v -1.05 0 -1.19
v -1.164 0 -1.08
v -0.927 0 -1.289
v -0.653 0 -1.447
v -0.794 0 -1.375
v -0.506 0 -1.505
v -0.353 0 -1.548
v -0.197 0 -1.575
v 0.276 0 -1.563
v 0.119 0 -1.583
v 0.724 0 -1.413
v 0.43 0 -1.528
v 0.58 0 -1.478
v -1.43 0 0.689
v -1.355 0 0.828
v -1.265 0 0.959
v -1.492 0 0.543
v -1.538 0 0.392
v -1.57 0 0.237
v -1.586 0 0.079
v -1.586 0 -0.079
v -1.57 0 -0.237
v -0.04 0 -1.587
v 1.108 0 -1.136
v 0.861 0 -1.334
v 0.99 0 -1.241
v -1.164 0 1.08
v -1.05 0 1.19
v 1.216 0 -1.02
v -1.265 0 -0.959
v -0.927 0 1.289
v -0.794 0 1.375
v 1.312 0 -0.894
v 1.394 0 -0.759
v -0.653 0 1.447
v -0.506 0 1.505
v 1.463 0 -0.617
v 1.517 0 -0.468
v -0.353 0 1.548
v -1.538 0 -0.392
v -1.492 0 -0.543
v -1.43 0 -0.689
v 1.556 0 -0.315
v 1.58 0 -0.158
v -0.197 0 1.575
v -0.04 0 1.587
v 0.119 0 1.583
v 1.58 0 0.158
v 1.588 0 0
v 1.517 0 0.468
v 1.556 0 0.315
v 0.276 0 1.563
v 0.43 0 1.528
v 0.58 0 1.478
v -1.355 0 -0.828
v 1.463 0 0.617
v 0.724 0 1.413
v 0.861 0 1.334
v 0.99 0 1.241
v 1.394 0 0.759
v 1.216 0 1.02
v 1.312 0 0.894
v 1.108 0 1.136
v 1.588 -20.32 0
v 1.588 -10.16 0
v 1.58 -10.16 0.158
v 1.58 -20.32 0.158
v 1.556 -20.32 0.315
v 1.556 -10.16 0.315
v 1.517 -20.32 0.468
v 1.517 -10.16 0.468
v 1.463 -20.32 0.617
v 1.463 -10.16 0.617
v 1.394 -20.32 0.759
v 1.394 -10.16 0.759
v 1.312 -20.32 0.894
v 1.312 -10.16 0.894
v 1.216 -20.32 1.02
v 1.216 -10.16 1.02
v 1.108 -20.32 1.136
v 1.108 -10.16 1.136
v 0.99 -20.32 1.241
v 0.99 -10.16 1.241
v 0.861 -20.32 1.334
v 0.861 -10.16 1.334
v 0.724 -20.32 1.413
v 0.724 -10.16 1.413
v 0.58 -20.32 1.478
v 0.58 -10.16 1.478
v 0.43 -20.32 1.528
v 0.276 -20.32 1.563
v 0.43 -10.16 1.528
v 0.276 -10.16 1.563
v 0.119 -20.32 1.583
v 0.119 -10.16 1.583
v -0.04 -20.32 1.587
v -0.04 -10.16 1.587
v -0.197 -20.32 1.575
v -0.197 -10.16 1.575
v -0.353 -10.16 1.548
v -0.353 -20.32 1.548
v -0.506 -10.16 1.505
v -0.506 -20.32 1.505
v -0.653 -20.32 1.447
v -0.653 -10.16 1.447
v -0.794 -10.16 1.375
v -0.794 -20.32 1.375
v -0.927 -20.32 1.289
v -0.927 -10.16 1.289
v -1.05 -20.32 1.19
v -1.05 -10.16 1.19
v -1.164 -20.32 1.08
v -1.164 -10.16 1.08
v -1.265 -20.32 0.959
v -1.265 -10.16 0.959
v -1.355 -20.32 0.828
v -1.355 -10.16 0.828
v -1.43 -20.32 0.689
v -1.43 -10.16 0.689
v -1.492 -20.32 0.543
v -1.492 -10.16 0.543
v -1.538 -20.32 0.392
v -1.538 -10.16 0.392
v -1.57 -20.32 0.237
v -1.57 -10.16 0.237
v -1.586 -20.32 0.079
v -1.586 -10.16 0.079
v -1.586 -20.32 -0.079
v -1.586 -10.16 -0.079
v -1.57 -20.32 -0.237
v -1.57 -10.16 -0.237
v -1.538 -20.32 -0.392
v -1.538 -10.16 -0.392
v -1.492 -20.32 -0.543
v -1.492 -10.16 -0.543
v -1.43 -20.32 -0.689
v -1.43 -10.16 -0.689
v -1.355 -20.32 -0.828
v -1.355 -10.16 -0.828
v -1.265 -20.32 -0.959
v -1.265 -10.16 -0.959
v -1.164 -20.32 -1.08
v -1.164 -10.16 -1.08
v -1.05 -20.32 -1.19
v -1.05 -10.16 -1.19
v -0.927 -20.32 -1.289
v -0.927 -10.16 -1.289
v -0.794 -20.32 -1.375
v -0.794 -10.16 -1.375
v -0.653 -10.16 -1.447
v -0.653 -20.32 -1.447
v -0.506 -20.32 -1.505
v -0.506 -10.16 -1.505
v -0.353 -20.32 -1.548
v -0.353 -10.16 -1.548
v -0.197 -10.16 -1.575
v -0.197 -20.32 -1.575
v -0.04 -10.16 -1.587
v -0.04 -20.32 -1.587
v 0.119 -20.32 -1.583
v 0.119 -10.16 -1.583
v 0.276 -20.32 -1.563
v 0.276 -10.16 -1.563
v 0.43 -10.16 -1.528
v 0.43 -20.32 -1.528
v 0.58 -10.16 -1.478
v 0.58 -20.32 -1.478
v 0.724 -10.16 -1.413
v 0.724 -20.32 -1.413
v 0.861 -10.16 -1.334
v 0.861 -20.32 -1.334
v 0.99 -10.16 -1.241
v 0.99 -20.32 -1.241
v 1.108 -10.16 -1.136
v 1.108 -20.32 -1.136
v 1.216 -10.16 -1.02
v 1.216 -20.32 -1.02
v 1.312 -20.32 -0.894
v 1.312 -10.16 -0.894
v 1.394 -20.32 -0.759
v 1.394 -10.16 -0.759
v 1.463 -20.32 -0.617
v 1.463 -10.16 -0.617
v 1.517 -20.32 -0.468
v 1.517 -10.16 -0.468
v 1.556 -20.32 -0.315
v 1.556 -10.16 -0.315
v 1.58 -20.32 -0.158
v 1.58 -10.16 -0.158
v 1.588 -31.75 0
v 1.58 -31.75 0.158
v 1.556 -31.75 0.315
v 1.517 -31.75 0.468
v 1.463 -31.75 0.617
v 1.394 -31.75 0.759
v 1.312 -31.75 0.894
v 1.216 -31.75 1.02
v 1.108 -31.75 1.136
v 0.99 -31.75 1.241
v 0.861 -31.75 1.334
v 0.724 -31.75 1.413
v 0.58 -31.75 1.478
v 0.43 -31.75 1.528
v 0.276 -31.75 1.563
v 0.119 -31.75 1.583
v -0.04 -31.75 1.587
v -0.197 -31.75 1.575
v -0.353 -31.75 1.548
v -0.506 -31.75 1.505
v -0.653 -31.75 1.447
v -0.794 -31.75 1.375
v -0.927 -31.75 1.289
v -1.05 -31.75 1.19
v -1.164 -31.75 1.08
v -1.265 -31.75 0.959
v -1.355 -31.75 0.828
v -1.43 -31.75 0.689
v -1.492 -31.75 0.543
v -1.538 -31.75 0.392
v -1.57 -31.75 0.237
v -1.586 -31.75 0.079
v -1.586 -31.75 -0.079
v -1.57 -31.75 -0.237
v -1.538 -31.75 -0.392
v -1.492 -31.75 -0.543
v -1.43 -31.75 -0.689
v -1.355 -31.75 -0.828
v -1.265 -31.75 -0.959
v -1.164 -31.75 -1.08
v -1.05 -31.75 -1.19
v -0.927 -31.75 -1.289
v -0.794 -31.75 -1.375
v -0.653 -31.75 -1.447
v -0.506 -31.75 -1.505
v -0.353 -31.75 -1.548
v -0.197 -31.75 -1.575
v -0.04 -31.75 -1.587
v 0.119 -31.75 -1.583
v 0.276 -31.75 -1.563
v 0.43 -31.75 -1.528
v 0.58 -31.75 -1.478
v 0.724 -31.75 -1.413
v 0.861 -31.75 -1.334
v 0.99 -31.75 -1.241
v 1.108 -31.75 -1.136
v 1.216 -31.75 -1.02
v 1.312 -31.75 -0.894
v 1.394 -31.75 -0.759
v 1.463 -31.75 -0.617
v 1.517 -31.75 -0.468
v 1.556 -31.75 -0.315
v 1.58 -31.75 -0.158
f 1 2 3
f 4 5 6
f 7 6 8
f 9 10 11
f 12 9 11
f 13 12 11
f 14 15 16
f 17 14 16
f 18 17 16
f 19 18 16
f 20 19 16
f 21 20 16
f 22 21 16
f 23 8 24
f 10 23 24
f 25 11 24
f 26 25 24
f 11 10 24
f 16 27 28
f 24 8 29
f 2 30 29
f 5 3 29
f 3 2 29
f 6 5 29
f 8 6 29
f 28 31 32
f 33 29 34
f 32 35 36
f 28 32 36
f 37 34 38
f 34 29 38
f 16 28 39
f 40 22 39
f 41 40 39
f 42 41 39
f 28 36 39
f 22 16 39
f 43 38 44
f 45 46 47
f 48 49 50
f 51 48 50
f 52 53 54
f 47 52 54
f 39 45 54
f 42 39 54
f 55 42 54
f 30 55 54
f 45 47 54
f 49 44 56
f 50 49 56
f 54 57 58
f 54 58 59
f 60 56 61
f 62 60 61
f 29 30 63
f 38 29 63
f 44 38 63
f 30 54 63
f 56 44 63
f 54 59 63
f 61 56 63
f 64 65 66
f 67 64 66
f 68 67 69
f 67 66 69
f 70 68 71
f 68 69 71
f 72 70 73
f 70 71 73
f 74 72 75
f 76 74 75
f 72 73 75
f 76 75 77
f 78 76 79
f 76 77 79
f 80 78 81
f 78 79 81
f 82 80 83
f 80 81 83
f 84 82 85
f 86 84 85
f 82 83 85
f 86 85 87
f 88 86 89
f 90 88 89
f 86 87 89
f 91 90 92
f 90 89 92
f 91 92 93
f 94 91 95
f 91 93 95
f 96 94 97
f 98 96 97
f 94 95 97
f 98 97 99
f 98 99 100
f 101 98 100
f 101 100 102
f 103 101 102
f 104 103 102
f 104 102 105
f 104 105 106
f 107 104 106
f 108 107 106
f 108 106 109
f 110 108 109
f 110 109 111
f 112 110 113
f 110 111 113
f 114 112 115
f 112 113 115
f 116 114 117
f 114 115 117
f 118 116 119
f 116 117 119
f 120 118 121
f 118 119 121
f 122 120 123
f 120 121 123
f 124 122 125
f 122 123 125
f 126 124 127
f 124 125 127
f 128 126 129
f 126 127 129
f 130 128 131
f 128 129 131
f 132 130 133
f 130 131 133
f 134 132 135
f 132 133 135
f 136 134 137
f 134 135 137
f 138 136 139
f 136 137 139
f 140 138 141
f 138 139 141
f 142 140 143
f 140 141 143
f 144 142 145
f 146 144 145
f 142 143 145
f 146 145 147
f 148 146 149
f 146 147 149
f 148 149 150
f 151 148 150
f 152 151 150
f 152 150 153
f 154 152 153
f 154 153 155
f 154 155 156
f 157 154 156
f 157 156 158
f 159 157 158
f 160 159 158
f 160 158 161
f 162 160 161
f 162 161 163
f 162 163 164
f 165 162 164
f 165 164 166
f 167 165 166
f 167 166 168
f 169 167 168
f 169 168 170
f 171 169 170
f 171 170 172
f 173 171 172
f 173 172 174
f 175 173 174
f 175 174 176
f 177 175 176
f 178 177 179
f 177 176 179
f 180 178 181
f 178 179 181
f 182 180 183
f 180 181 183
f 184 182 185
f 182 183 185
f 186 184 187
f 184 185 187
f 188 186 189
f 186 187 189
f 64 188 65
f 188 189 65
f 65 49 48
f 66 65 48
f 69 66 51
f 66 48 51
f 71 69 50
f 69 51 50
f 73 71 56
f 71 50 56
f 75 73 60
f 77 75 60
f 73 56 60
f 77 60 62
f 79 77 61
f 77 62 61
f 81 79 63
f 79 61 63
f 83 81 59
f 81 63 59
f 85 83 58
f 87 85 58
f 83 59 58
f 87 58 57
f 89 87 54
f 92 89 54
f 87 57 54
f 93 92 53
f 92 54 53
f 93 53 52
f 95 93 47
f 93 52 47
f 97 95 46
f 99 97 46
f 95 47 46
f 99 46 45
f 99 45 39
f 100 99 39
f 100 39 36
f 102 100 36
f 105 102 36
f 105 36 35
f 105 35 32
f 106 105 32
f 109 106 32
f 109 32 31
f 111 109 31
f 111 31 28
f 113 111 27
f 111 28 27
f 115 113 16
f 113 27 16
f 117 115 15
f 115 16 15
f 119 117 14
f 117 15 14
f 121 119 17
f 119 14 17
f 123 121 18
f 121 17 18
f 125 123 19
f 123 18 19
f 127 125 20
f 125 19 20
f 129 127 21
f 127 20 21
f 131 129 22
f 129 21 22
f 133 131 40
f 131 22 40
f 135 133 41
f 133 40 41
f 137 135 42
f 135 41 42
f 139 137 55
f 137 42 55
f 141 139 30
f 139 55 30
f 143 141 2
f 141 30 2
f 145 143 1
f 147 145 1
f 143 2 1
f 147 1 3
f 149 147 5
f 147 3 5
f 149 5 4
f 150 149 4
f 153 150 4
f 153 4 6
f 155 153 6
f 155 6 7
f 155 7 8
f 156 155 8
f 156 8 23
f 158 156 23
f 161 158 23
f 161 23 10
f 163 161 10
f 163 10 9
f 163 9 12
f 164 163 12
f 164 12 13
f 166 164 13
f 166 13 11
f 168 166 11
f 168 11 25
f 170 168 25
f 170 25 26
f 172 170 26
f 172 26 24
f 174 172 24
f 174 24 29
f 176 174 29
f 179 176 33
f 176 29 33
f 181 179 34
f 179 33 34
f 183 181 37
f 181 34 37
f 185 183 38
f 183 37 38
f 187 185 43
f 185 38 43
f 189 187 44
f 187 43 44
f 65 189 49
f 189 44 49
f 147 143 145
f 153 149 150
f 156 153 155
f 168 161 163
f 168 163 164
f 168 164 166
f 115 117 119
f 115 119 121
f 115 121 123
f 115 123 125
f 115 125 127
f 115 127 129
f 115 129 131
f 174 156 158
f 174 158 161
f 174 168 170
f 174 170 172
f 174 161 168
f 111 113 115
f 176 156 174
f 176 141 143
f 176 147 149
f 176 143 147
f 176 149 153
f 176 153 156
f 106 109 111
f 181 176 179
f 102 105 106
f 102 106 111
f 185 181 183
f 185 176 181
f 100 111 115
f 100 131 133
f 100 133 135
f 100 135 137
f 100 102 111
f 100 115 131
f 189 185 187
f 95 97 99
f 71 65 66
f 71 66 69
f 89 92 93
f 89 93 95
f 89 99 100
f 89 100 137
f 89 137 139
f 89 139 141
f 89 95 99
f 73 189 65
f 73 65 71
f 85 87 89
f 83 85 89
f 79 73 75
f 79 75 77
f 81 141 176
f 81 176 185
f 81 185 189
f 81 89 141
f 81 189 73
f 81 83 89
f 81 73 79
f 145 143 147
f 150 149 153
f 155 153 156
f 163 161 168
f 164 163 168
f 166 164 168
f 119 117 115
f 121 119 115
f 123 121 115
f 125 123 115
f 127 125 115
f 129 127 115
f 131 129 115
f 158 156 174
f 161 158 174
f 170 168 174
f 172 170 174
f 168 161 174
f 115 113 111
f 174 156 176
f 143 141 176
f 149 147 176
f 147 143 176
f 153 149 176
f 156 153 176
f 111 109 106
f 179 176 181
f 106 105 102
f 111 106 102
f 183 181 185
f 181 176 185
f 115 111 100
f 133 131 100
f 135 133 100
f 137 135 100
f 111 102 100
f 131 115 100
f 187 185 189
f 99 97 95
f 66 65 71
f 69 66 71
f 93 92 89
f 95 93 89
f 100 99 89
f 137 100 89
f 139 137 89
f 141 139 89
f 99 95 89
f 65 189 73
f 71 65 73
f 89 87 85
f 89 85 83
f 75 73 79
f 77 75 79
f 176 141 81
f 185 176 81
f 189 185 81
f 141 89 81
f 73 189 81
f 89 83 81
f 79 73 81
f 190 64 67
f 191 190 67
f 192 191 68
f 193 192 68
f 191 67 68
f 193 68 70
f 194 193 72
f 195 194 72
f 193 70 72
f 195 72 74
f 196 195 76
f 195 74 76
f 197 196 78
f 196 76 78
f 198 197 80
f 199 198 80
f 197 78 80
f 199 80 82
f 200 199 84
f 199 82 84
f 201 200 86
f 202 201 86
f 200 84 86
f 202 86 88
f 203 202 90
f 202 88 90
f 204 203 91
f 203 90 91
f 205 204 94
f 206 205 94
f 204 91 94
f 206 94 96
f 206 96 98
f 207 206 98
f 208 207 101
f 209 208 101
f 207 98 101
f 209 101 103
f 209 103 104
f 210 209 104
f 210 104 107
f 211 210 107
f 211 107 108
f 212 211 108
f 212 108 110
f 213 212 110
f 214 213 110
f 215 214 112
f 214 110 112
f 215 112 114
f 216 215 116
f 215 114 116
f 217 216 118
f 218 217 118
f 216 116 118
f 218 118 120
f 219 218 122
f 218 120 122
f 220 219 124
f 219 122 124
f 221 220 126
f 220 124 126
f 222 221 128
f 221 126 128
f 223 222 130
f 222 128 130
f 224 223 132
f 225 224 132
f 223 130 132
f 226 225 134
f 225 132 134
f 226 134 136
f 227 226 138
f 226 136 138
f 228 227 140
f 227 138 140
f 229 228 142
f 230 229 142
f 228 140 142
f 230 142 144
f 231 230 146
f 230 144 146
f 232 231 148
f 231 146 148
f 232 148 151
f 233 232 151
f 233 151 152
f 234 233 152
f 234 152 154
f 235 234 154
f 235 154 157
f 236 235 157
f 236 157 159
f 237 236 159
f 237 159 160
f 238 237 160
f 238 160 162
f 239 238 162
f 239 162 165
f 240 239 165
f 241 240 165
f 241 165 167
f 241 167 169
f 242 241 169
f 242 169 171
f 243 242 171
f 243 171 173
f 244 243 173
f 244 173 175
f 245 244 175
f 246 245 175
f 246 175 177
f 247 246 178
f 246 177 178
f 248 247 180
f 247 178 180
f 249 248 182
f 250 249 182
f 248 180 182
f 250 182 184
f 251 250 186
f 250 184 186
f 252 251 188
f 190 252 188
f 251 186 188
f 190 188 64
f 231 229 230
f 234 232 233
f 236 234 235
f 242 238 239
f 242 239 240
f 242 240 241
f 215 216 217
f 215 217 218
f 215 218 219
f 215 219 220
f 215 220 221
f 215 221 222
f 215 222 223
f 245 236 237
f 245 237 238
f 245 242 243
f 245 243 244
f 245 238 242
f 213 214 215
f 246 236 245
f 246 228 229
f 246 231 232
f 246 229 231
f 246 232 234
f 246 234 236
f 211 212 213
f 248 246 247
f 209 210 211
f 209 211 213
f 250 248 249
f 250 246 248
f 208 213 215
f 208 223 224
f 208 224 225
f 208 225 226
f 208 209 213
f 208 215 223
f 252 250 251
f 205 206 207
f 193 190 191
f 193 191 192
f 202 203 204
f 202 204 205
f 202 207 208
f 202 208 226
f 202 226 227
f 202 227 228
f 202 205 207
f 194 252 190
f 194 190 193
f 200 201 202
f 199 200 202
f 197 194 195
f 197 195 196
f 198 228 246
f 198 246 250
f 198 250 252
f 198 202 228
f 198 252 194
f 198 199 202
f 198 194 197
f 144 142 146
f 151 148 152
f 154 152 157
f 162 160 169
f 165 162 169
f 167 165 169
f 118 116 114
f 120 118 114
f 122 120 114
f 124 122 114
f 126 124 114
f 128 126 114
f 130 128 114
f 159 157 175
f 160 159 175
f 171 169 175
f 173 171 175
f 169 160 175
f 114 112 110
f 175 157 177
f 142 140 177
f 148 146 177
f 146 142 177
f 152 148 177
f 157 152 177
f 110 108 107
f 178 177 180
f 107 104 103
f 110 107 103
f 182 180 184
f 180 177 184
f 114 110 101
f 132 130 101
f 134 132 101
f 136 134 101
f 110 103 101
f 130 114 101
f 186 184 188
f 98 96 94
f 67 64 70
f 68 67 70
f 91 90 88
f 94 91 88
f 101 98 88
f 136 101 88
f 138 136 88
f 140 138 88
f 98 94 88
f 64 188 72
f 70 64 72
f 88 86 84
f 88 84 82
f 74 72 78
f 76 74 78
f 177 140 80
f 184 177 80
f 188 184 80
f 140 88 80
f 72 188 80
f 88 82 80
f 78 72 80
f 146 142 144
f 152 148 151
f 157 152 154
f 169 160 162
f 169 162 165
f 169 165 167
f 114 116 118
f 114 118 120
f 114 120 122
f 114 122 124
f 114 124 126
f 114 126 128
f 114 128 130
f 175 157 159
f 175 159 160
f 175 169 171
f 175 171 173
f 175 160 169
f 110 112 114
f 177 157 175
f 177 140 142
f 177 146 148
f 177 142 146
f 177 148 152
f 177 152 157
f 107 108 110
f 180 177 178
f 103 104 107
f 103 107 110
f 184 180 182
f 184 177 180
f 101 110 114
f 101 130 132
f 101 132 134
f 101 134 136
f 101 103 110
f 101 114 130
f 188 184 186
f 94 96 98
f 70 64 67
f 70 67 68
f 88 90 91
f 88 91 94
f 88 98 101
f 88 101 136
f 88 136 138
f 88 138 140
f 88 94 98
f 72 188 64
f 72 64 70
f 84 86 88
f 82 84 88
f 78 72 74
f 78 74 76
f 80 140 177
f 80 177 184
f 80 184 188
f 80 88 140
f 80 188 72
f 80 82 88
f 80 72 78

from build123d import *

# Parameters (mm, degrees)
F0_R     = 1.5875
F1_DEPTH = 10.16
F2_R     = 1.5875
F3_DEPTH = 10.16
F4_R     = 1.5875
F5_DEPTH = 11.43


with BuildPart() as f1:
    # F0 (on Front) → F1 (new body)
    with BuildSketch(Plane.XZ):
        Circle(F0_R)
    extrude(amount=F1_DEPTH)


with BuildPart() as f3:
    # F2 (on face) → F3 (new body)
    with BuildSketch(Plane.XZ.offset(10.16)):
        Circle(F2_R)
    extrude(amount=F3_DEPTH)


with BuildPart() as f5:
    # F4 (on face) → F5 (new body)
    with BuildSketch(Plane.XZ.offset(20.32)):
        Circle(F4_R)
    extrude(amount=F5_DEPTH)


solid = Compound([f1.part, f3.part, f5.part])
